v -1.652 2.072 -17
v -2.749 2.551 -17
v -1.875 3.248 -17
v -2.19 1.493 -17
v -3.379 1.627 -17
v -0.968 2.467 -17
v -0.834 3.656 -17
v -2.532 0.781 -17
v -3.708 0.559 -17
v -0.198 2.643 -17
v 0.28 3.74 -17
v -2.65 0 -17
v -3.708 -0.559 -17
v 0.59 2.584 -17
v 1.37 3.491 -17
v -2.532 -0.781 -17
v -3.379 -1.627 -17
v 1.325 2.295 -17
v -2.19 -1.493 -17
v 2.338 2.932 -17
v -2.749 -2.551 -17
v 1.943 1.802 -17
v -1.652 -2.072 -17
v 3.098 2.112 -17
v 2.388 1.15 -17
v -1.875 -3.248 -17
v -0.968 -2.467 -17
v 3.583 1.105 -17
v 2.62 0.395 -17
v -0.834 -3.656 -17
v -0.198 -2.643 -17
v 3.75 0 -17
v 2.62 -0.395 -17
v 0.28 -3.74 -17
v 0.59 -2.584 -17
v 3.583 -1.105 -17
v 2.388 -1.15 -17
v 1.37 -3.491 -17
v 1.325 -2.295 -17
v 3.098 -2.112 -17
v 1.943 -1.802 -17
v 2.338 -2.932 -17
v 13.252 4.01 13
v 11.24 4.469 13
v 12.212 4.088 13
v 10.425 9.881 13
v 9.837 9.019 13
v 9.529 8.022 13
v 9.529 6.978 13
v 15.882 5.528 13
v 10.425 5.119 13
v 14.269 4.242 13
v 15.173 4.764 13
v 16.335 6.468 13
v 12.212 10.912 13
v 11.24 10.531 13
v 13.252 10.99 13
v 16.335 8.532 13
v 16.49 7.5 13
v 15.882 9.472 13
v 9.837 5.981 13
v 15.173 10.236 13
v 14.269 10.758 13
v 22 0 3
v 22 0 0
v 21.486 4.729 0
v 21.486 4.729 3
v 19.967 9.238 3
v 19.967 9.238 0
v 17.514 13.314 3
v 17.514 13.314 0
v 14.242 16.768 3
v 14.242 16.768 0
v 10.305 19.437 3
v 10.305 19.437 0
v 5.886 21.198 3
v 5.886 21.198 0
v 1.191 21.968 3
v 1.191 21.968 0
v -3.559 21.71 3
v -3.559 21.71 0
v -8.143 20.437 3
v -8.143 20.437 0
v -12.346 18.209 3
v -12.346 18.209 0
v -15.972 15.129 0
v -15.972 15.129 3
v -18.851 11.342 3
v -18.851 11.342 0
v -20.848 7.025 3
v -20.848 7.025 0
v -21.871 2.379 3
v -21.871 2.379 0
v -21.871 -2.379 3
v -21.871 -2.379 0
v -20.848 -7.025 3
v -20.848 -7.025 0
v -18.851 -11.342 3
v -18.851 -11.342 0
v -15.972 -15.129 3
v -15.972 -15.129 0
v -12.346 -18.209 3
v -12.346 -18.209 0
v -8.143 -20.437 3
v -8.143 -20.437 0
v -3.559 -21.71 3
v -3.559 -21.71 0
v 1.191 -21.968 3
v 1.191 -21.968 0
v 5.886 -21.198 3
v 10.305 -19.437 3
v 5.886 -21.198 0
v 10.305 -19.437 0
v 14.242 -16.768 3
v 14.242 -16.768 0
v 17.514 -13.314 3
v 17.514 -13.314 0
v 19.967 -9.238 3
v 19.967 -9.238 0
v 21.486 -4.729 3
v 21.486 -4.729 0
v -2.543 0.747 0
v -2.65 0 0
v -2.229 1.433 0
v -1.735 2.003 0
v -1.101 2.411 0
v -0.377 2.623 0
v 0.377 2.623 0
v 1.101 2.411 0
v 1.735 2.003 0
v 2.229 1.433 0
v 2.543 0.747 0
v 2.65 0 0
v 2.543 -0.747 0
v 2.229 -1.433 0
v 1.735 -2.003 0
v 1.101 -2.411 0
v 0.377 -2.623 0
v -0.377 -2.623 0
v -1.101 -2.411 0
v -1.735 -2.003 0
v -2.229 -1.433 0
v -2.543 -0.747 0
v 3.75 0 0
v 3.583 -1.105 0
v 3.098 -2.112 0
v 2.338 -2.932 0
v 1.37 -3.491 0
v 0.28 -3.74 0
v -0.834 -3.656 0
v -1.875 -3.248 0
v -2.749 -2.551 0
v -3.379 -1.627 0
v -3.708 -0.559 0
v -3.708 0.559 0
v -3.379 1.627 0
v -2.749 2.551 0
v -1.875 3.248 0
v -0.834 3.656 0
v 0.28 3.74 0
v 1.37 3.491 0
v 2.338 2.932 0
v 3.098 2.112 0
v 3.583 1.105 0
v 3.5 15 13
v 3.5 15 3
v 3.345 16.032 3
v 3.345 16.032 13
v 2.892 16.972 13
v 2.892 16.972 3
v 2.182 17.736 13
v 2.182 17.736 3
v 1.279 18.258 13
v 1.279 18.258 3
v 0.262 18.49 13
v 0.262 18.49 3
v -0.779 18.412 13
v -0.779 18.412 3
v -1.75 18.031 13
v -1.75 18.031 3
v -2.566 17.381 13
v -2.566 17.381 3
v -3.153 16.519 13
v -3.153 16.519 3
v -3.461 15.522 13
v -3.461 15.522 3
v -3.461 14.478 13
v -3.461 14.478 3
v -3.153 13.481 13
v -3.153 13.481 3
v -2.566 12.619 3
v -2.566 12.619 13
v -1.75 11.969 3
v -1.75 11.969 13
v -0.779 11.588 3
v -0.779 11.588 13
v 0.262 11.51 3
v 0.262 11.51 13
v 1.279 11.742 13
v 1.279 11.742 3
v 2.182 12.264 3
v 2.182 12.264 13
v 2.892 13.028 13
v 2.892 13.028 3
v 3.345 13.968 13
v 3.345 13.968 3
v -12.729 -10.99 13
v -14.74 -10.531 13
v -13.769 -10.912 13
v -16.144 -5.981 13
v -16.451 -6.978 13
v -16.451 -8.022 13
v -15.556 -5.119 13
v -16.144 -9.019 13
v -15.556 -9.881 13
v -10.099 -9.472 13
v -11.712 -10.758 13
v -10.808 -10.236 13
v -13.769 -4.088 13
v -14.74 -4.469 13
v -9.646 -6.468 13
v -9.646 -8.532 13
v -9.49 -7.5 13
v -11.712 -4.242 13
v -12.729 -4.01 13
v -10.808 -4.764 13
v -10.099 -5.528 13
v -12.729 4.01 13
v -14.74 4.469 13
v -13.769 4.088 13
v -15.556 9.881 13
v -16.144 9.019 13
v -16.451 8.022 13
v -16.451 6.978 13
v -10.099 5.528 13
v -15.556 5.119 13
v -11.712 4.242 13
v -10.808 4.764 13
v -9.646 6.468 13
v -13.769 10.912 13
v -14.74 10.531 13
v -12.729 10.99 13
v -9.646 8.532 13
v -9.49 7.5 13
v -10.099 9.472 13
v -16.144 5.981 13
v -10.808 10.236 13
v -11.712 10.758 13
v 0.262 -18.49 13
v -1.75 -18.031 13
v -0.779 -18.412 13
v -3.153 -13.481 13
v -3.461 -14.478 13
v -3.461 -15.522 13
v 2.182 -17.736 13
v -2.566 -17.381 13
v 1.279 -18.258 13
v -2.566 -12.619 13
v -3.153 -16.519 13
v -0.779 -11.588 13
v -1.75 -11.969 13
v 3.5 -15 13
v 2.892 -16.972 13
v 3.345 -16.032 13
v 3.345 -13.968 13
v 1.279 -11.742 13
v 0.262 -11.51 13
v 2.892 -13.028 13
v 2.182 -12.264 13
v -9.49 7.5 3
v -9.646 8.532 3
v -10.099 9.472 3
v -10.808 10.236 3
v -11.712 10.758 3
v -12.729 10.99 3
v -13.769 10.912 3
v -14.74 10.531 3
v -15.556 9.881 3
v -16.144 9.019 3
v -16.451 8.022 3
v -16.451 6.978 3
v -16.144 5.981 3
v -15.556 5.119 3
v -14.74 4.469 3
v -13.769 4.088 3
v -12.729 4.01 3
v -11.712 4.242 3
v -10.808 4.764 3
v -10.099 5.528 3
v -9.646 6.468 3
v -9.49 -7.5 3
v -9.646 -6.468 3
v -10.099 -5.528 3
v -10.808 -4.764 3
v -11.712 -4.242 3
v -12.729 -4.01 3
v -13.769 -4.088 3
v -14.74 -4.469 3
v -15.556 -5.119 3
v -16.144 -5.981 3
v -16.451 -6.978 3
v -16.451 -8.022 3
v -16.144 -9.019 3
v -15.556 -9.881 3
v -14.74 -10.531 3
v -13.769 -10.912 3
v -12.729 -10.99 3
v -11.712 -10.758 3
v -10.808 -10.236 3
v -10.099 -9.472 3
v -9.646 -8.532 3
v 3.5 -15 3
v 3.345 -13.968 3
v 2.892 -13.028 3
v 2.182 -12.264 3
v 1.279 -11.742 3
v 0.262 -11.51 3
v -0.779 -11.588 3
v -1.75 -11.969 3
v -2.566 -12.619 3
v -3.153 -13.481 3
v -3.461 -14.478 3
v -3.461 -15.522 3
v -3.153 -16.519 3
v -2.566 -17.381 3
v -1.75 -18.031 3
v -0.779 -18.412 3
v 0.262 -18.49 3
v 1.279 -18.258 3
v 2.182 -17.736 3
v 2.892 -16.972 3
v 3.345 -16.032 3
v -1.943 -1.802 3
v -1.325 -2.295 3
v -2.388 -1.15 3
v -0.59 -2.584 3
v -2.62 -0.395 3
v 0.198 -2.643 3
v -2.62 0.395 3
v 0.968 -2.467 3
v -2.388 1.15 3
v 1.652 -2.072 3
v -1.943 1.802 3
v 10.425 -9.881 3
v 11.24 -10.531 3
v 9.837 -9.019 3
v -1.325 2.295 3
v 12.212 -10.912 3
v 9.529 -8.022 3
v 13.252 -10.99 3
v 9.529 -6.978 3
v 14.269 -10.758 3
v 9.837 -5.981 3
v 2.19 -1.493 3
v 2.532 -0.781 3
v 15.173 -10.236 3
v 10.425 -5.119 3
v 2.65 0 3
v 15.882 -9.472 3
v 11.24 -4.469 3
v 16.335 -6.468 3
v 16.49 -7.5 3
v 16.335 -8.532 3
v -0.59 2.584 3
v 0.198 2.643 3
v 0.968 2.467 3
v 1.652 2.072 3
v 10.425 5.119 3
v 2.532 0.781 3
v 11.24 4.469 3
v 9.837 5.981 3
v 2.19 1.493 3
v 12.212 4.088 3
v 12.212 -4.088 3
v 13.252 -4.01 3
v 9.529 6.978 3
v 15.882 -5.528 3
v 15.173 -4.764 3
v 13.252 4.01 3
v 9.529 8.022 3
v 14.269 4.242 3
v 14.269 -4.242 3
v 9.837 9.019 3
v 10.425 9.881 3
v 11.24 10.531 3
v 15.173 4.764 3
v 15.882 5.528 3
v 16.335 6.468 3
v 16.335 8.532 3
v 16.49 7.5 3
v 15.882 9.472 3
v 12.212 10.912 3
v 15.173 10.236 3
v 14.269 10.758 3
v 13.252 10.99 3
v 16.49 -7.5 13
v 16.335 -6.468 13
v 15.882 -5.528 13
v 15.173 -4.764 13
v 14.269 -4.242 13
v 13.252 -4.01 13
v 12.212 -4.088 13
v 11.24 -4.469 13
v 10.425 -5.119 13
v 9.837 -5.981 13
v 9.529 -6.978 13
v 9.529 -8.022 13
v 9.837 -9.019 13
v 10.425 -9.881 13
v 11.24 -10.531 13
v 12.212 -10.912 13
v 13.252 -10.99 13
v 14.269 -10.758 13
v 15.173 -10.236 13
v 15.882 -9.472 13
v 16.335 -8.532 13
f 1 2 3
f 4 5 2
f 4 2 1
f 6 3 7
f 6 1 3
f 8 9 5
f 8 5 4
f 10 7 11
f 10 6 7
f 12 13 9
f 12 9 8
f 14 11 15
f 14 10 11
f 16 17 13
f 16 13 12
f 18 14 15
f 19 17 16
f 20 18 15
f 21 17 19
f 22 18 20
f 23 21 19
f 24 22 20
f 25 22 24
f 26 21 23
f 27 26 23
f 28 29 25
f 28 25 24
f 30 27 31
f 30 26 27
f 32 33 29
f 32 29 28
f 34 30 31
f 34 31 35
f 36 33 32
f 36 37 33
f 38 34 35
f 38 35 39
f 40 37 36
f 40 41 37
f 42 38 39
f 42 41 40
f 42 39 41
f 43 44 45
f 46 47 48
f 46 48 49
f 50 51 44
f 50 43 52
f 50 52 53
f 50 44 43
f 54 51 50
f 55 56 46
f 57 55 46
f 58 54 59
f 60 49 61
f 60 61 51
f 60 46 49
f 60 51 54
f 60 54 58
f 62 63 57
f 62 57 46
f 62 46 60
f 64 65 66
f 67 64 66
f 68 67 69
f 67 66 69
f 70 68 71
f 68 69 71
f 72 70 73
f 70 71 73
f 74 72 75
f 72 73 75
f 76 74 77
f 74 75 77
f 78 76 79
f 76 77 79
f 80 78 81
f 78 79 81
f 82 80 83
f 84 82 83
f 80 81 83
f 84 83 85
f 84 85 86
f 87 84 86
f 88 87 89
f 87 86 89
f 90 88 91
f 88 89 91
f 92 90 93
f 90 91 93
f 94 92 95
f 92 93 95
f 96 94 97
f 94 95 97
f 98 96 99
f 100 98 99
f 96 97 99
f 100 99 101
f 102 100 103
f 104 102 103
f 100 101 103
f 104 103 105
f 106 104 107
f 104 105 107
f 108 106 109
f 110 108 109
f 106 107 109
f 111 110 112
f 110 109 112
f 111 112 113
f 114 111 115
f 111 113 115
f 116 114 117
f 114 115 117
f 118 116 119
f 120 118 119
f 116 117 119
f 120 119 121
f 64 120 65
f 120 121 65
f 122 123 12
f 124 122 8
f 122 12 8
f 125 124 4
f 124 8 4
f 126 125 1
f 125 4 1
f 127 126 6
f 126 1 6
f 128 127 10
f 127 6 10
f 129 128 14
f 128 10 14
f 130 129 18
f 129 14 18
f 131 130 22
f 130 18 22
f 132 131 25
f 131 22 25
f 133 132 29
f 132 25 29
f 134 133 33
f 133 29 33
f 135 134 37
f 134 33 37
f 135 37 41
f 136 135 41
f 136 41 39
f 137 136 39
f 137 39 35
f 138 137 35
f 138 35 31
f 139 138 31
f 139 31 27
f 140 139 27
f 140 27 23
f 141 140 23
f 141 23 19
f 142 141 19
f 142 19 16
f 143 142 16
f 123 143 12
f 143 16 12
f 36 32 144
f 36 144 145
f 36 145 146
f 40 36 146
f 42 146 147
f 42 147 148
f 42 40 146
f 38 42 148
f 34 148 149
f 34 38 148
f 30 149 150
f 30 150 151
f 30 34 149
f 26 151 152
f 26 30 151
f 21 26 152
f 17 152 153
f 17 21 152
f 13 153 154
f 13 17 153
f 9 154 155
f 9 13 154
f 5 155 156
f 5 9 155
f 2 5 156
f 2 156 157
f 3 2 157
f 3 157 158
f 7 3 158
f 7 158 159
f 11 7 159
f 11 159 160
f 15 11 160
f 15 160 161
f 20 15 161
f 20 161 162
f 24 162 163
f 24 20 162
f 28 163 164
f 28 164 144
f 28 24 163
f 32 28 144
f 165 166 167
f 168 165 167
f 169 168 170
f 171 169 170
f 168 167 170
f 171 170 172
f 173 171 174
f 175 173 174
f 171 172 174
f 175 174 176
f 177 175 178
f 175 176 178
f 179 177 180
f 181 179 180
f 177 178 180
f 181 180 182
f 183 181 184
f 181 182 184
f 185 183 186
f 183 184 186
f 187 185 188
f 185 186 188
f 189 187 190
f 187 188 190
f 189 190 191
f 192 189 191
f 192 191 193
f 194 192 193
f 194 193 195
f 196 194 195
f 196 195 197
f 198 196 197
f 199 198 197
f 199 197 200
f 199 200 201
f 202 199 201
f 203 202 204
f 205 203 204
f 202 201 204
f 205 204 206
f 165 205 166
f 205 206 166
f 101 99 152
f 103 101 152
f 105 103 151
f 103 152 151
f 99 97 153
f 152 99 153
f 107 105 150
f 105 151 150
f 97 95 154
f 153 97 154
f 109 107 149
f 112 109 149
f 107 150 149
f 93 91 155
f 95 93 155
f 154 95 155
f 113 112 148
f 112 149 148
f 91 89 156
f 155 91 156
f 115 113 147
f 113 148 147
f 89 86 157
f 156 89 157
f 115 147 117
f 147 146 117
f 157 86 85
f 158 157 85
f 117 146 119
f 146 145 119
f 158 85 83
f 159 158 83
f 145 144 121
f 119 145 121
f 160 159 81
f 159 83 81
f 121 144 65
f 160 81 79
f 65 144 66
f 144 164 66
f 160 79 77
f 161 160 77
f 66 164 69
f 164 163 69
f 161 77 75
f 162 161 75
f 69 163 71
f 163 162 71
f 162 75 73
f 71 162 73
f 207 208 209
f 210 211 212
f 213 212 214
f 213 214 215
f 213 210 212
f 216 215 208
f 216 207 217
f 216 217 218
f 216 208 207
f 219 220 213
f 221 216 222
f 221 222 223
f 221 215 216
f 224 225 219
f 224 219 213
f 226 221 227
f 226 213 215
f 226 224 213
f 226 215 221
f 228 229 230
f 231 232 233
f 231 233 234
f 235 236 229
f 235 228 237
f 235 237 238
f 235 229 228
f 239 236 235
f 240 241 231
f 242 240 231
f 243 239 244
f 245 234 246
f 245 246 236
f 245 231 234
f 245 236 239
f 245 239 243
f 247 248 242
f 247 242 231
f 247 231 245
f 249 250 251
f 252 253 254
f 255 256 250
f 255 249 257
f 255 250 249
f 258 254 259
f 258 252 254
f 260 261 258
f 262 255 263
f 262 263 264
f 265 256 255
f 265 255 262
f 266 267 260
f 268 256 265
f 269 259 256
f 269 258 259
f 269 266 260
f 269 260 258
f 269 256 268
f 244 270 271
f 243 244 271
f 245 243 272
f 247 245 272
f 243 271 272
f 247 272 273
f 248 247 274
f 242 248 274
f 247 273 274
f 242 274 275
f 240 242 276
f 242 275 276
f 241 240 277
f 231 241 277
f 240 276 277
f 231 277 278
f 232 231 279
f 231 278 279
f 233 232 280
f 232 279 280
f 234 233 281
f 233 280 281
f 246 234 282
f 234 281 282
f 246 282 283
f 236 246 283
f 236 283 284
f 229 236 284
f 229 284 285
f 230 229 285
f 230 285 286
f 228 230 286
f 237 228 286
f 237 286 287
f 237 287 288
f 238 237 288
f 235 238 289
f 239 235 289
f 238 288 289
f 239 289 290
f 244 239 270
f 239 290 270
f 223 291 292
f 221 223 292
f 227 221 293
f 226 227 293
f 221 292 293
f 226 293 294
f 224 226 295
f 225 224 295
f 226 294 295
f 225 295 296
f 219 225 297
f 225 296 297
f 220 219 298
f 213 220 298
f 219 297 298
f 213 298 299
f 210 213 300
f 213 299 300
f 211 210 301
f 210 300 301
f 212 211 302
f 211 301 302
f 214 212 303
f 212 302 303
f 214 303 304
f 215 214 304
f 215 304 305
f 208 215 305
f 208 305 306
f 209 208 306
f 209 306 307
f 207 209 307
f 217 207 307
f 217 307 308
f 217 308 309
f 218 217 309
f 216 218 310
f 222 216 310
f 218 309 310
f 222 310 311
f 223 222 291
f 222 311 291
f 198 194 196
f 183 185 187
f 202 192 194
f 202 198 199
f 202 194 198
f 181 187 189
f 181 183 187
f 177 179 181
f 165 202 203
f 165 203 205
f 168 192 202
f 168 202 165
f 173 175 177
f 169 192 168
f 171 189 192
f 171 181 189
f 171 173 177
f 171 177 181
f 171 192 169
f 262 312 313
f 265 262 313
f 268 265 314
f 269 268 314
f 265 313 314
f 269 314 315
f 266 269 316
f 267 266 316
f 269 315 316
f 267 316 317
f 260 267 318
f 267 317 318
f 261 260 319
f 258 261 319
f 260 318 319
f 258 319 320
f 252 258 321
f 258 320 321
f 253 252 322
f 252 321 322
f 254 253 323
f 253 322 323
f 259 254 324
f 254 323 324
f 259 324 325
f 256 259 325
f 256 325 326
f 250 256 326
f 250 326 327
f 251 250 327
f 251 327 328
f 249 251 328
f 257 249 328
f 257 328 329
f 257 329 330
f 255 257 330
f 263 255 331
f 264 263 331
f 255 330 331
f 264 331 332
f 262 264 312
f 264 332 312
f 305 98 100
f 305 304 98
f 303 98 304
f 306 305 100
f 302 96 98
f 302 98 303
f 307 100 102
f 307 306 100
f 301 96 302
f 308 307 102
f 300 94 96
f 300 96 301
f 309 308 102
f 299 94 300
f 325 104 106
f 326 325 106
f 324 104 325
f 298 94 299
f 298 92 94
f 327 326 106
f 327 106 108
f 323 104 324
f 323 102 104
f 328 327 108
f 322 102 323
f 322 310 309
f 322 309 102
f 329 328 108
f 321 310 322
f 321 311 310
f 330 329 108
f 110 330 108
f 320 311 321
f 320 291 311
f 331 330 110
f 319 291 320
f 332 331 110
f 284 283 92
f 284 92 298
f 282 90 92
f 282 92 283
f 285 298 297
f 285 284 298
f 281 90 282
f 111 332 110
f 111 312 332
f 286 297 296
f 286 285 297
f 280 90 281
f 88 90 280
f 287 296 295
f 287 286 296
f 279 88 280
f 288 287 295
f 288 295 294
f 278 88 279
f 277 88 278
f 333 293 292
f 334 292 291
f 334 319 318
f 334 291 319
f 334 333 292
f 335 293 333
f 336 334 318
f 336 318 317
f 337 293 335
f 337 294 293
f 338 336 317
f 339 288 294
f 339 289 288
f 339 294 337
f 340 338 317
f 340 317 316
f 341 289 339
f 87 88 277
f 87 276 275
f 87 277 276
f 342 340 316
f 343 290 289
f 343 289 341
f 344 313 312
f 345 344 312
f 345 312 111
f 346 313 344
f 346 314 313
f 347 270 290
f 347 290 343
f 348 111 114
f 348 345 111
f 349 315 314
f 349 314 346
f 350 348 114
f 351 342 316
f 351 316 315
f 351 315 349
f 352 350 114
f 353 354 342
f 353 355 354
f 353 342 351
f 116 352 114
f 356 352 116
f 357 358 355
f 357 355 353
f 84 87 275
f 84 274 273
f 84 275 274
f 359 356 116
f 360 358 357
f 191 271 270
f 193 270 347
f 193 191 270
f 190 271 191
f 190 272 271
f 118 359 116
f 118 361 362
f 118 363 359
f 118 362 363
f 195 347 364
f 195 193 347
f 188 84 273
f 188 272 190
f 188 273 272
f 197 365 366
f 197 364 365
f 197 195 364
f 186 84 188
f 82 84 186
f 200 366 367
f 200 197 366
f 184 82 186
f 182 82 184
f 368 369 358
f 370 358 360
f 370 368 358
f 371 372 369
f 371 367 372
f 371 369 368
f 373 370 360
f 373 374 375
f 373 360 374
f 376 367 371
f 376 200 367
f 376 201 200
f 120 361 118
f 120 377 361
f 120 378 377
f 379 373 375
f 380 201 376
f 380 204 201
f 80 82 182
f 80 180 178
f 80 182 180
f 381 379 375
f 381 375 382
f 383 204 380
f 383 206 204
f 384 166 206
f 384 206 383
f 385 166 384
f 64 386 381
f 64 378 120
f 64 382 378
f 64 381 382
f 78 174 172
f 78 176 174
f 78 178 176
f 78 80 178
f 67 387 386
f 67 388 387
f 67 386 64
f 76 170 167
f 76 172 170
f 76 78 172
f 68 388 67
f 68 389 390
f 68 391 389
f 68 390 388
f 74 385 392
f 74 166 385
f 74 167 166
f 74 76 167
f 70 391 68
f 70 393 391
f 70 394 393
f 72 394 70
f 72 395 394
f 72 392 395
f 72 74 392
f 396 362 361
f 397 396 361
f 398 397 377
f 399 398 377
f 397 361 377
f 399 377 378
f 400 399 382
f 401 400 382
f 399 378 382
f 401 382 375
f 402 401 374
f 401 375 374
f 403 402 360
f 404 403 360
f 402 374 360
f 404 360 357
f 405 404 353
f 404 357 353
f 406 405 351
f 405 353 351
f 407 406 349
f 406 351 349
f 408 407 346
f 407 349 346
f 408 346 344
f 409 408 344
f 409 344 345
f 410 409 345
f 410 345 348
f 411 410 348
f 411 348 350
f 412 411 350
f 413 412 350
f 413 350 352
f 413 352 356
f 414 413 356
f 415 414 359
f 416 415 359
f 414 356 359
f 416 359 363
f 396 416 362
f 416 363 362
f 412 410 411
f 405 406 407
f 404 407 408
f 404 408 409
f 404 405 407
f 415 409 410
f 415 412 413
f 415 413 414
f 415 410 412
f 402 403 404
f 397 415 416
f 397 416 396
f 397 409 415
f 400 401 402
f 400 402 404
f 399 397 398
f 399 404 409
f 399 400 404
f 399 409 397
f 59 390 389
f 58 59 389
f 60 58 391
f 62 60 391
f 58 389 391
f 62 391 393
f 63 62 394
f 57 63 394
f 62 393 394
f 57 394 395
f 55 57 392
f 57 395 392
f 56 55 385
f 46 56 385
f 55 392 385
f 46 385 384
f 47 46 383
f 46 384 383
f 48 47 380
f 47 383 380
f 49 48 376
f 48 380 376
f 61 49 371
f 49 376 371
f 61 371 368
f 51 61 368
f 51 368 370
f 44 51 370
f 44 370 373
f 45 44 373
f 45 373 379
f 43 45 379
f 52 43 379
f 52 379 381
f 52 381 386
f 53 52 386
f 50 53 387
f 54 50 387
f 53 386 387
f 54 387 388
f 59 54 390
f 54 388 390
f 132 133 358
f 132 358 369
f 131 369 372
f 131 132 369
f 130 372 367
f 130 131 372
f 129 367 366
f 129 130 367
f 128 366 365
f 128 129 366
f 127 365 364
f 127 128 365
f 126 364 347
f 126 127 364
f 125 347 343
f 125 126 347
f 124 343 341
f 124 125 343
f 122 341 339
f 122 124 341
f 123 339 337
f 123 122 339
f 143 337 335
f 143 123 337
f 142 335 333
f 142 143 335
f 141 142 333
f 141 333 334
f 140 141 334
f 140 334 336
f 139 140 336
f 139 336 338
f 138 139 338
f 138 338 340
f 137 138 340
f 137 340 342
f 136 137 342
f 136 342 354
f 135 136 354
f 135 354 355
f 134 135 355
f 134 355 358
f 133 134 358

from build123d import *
from build123d.topology import SkipClean

# Parameters (mm, degrees)
SKETCH1_R           = 22
SKETCH1_R_2         = 2.65
BOSS_EXTRUDE1_DEPTH = 3
SKETCH2_R           = 3.5
BOSS_EXTRUDE2_DEPTH = 10
BOSS_EXTRUDE3_START = 17
SKETCH3_R           = 3.75
SKETCH3_R_2         = 2.65
BOSS_EXTRUDE3_DEPTH = 17


with BuildPart() as part:
    # Sketch1 → Boss-Extrude1 (new body)
    with BuildSketch(Plane.XY):
        Circle(SKETCH1_R)
        Circle(SKETCH1_R_2, mode=Mode.SUBTRACT)
    extrude(amount=BOSS_EXTRUDE1_DEPTH)

    # Sketch2 → Boss-Extrude2 (add)
    with BuildSketch(Plane.XY.offset(3)):
        with Locations((0, 15)):
            Circle(SKETCH2_R)
        with Locations((12.990381057, 7.5)):
            Circle(SKETCH2_R)
        with Locations((12.990381057, -7.5)):
            Circle(SKETCH2_R)
        with Locations((0, -15)):
            Circle(SKETCH2_R)
        with Locations((-12.990381057, -7.5)):
            Circle(SKETCH2_R)
        with Locations((-12.990381057, 7.5)):
            Circle(SKETCH2_R)
    extrude(amount=BOSS_EXTRUDE2_DEPTH)

    # Sketch3 → Boss-Extrude3 (add)
    with SkipClean():  # the faces are left unmerged after this step: merging them gives an invalid solid
        with BuildSketch(Plane(origin=(0, 0, 0), x_dir=(-1, 0, 0), z_dir=(0, 0, -1)).offset(BOSS_EXTRUDE3_START)):
            with Locations(Location((0, 0, 0), (0, 0, 180))):
                Circle(SKETCH3_R)
            Circle(SKETCH3_R_2, mode=Mode.SUBTRACT)
        extrude(amount=-BOSS_EXTRUDE3_DEPTH)


solid = part.part
